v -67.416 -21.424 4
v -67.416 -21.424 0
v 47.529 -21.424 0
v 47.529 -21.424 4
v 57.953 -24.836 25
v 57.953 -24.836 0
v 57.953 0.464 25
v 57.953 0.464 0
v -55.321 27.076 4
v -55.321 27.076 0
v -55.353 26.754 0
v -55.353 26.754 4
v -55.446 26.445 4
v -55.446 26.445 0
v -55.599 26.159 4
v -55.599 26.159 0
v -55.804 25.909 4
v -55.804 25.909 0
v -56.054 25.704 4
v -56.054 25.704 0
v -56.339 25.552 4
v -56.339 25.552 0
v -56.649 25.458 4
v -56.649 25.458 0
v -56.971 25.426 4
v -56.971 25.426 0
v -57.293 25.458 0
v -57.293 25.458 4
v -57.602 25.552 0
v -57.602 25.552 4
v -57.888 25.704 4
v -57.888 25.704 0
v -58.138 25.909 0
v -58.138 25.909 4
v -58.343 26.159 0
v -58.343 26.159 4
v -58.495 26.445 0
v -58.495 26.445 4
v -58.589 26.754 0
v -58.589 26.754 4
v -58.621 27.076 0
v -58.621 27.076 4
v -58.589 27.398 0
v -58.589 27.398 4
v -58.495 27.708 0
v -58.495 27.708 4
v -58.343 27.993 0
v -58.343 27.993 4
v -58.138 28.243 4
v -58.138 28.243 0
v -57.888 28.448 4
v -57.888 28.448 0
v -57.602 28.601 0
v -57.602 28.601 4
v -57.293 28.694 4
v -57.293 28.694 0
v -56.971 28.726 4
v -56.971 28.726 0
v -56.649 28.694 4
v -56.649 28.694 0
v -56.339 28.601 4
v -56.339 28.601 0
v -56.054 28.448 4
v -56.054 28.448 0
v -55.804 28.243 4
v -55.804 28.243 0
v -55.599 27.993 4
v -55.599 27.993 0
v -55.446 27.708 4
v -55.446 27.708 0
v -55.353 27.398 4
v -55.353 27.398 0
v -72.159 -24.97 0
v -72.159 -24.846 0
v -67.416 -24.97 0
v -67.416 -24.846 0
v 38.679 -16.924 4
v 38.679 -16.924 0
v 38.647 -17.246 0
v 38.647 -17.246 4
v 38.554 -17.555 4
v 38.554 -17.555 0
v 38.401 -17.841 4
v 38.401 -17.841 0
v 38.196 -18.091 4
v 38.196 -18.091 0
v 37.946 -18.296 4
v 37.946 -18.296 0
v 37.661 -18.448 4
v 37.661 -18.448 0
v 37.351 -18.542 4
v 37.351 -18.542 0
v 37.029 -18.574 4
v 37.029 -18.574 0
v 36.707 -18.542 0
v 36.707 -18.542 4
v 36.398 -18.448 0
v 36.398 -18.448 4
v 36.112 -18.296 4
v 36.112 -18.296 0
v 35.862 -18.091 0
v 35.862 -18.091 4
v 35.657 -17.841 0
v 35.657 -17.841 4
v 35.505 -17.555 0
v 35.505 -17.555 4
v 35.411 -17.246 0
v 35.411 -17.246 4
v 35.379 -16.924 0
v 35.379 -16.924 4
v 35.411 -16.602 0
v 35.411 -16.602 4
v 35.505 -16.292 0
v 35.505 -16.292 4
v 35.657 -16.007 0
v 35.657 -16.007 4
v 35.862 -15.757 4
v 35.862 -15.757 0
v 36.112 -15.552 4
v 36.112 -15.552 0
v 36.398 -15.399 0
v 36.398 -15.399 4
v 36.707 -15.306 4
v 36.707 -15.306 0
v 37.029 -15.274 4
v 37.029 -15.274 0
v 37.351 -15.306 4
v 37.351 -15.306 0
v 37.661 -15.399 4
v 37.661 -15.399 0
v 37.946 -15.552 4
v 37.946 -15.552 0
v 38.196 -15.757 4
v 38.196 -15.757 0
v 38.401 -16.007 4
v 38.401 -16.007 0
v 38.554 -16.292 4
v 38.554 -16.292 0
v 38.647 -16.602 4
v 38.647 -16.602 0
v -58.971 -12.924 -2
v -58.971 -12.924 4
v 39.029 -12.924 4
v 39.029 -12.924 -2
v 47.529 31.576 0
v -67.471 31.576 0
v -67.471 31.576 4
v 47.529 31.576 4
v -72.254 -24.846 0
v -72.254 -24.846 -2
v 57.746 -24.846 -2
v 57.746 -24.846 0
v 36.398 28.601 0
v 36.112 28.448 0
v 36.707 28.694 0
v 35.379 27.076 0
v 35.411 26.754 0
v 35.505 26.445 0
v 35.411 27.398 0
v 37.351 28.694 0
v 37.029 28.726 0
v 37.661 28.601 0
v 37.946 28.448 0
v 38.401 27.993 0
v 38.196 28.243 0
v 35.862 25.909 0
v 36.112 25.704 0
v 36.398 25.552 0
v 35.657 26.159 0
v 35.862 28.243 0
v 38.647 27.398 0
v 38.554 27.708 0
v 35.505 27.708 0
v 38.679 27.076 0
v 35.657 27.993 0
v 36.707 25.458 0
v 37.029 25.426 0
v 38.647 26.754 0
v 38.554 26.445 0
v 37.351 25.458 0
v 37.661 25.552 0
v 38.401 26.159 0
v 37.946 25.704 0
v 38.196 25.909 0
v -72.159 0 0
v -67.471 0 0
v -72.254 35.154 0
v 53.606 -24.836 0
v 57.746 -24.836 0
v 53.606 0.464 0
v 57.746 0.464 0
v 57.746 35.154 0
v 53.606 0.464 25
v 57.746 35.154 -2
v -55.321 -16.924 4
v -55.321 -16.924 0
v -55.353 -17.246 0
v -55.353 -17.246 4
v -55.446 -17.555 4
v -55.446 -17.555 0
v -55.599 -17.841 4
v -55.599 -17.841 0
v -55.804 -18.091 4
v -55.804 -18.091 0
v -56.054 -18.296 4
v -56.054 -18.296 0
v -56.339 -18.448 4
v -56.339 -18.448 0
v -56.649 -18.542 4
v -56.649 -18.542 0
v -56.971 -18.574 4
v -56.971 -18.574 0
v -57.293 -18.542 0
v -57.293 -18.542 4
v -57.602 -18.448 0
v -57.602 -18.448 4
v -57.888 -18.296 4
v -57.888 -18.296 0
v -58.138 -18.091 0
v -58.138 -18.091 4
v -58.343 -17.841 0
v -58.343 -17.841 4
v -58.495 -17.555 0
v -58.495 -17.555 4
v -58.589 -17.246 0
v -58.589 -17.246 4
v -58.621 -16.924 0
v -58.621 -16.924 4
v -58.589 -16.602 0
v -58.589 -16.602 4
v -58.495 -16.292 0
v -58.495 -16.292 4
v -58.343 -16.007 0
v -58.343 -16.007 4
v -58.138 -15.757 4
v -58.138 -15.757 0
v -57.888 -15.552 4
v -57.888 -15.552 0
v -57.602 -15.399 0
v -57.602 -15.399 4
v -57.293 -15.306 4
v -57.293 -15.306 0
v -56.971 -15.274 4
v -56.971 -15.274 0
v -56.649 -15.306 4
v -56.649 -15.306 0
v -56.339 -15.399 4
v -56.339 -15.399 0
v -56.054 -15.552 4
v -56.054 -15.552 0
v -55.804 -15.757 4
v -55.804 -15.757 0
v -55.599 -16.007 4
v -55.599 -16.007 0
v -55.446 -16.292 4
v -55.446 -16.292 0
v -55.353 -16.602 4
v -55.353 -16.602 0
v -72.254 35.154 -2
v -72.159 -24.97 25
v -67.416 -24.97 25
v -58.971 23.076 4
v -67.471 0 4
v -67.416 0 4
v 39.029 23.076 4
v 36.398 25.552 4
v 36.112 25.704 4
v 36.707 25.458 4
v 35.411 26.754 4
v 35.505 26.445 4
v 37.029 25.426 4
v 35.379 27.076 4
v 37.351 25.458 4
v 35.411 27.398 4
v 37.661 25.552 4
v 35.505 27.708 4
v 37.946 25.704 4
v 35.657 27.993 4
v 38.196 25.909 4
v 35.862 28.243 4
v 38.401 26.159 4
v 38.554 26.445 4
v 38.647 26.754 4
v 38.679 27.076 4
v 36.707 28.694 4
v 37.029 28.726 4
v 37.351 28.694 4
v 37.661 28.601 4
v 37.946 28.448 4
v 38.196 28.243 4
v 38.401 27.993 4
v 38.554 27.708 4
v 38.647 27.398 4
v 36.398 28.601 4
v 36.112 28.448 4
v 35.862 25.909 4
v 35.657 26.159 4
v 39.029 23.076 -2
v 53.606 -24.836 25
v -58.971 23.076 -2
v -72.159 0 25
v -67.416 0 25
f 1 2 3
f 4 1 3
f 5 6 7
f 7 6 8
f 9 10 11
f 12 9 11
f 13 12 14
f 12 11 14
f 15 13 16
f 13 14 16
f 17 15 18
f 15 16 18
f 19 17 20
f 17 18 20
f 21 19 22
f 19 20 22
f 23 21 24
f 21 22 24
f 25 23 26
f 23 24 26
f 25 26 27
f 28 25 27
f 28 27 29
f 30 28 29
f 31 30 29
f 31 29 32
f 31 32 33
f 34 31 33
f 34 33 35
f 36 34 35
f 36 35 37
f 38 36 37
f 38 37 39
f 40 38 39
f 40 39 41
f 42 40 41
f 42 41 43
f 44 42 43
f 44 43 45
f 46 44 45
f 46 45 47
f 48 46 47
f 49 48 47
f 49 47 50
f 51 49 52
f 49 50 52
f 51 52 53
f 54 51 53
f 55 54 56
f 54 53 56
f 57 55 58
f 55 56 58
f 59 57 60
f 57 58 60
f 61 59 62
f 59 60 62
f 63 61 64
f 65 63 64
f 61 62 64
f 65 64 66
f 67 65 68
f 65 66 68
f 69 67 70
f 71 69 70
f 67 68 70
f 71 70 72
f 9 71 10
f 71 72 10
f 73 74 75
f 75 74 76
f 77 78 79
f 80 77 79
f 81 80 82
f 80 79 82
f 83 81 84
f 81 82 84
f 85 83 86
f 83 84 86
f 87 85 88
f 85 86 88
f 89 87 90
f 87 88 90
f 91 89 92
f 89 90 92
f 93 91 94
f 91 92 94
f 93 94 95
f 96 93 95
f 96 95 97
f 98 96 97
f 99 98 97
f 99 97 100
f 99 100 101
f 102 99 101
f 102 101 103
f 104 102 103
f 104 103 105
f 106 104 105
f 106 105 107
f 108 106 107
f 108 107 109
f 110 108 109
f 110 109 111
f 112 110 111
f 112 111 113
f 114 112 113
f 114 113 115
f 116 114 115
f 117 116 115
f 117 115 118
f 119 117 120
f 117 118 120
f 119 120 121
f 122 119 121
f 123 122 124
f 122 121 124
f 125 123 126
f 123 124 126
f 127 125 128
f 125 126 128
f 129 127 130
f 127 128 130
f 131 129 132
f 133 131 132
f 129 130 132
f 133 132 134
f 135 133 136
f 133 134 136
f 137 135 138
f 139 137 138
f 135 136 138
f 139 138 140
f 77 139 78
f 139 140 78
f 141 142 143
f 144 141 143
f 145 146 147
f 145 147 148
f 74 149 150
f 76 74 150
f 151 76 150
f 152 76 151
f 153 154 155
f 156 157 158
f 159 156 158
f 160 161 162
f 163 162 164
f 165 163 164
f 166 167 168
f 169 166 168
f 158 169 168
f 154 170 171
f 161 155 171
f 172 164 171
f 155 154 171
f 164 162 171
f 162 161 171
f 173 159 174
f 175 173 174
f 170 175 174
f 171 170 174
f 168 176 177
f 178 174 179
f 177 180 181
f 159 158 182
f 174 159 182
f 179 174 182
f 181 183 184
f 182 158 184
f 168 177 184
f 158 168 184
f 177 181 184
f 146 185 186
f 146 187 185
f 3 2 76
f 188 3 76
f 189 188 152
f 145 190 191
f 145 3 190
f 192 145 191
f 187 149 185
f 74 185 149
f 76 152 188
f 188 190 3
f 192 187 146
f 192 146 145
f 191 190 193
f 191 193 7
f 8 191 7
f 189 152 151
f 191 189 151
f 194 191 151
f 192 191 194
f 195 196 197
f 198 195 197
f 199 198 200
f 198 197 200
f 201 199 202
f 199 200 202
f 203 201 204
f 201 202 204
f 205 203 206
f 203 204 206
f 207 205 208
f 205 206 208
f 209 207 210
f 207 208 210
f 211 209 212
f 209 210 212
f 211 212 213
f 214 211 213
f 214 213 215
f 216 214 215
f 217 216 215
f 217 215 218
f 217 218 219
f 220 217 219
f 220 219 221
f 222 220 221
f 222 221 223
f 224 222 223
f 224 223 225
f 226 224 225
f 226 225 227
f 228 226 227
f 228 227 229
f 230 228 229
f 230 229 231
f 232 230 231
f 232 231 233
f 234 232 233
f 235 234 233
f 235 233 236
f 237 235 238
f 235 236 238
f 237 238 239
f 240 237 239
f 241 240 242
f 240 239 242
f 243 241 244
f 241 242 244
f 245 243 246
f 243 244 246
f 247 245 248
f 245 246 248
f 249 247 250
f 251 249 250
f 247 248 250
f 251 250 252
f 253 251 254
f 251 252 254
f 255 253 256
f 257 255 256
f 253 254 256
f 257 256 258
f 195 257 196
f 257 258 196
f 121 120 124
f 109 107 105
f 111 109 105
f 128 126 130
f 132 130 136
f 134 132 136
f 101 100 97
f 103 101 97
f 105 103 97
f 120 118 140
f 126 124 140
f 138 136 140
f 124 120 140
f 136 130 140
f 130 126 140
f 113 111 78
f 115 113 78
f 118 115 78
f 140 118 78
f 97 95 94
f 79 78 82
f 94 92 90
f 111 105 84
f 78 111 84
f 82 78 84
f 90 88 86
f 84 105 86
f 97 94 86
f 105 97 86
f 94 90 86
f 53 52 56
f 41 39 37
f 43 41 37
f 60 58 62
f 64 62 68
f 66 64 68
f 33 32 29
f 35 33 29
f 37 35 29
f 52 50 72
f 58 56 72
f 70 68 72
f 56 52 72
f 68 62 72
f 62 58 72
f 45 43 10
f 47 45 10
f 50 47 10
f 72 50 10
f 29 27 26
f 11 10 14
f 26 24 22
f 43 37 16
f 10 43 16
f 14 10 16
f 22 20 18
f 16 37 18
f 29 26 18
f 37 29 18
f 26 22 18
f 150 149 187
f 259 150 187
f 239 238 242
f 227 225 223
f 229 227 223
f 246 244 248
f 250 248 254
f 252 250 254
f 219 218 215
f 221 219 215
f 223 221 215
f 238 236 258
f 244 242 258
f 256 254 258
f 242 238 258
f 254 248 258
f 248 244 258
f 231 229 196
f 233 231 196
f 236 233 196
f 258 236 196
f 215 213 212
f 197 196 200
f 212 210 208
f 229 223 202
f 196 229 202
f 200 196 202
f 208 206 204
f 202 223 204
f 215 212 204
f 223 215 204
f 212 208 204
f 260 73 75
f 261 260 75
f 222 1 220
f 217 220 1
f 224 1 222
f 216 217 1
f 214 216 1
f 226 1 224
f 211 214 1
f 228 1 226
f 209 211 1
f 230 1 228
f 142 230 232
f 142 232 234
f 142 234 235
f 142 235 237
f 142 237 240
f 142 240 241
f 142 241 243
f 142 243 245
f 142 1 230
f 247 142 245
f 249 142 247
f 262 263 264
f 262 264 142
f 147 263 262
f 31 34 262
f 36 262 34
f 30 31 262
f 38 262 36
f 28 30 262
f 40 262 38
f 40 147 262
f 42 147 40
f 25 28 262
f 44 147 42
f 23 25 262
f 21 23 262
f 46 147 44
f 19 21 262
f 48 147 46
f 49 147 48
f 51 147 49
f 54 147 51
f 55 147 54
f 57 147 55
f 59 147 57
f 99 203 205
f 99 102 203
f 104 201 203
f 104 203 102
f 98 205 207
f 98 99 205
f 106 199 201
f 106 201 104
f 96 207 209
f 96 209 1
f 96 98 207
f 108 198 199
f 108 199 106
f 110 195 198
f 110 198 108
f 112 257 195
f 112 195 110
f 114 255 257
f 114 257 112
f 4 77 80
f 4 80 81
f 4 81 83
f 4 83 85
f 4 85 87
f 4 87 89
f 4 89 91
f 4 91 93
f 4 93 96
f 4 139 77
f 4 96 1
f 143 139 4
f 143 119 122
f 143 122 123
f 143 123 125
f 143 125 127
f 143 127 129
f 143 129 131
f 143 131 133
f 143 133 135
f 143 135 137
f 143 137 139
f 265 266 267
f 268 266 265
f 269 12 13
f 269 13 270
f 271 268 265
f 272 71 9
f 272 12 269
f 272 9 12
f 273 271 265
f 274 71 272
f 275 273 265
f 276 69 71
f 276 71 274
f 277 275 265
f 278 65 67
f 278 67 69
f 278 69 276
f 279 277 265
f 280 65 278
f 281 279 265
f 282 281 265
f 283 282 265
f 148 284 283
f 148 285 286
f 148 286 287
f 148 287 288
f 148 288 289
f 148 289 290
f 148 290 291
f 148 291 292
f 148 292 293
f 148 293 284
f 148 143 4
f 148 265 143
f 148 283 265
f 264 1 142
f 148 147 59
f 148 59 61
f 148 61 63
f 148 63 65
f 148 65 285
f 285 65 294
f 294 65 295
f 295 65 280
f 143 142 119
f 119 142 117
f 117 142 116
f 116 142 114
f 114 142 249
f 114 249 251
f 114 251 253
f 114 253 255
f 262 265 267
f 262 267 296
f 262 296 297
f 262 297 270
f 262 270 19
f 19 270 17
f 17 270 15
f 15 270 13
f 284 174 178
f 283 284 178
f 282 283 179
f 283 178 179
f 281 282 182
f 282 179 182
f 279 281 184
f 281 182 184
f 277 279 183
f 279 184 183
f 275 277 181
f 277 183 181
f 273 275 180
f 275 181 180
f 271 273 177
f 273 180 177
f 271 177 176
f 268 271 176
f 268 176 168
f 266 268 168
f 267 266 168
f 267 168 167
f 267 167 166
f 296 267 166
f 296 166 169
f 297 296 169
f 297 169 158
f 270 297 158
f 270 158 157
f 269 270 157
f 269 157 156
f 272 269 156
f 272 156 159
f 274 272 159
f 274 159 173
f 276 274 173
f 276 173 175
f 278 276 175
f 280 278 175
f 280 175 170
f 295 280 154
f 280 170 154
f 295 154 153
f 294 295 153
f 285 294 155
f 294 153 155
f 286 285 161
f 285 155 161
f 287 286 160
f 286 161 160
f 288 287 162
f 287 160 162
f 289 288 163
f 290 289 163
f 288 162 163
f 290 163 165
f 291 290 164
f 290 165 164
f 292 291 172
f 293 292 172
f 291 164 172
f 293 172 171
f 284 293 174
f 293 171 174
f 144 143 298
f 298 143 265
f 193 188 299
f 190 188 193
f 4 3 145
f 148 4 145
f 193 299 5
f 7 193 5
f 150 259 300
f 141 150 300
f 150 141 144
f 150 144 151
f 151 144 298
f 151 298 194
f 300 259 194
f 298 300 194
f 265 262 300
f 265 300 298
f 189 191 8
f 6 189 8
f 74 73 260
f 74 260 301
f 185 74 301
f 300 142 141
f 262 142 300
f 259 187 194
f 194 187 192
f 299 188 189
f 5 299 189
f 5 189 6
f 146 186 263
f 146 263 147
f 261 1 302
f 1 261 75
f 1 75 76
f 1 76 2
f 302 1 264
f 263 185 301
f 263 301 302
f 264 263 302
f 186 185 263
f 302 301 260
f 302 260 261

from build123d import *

# Parameters (mm, degrees)
F0_W     = 115
F0_H     = 53
F0_W_2   = 98
F0_H_2   = 36
F1_DEPTH = 4
F2_W     = 130
F2_H     = 60
F3_DEPTH = 2
F4_DEPTH = 2.001
F5_D     = 3.3
F5_DEPTH = 4.001
F6_W     = 4.3469965458
F6_H     = 25.2998827054
F6_W_2   = 4.7431737185
F6_H_2   = 24.9695125967
F7_DEPTH = 25


with BuildPart() as f1:
    # F0 (on Top) → F1 (new body)
    with BuildSketch(Plane.XY):
        with Locations((-9.9708801619, 5.0761482663)):
            Rectangle(F0_W, F0_H)
        with Locations((-9.9708801619, 5.0761482663)):
            Rectangle(F0_W_2, F0_H_2, mode=Mode.SUBTRACT)
    extrude(amount=F1_DEPTH)

    # F2 (on Top) → F3 (join)
    with BuildSketch(Plane.XY):
        with Locations((-7.2538307309, 5.1540893316)):
            Rectangle(F2_W, F2_H)
    extrude(amount=-F3_DEPTH)

    # F0 (on Top) → F4 (cut, through all)
    with BuildSketch(Plane.XY):
        with Locations((-9.9708801619, 5.0761482663)):
            Rectangle(F0_W_2, F0_H_2)
    extrude(amount=-F4_DEPTH, mode=Mode.SUBTRACT)

    # F5 (through all, one way)
    with BuildSketch(Plane(origin=(0, 0, 0), x_dir=(1, 0, 0), z_dir=(0, 0, -1))):
        with Locations((-56.9708801619, -27.0761482663), (-56.9708801619, 16.9238517337), (37.0291198381, 16.9238517337), (37.0291198381, -27.0761482663)):
            Circle(F5_D / 2)
    extrude(amount=-F5_DEPTH, mode=Mode.SUBTRACT)

    # F6 (on Top) → F7 (join)
    with BuildSketch(Plane.XY):
        with Locations((55.7790957391, -12.1861611478)):
            Rectangle(F6_W, F6_H)
        with Locations((-69.787338376, -12.4847562984)):
            Rectangle(F6_W_2, F6_H_2)
    extrude(amount=F7_DEPTH)


solid = f1.part
